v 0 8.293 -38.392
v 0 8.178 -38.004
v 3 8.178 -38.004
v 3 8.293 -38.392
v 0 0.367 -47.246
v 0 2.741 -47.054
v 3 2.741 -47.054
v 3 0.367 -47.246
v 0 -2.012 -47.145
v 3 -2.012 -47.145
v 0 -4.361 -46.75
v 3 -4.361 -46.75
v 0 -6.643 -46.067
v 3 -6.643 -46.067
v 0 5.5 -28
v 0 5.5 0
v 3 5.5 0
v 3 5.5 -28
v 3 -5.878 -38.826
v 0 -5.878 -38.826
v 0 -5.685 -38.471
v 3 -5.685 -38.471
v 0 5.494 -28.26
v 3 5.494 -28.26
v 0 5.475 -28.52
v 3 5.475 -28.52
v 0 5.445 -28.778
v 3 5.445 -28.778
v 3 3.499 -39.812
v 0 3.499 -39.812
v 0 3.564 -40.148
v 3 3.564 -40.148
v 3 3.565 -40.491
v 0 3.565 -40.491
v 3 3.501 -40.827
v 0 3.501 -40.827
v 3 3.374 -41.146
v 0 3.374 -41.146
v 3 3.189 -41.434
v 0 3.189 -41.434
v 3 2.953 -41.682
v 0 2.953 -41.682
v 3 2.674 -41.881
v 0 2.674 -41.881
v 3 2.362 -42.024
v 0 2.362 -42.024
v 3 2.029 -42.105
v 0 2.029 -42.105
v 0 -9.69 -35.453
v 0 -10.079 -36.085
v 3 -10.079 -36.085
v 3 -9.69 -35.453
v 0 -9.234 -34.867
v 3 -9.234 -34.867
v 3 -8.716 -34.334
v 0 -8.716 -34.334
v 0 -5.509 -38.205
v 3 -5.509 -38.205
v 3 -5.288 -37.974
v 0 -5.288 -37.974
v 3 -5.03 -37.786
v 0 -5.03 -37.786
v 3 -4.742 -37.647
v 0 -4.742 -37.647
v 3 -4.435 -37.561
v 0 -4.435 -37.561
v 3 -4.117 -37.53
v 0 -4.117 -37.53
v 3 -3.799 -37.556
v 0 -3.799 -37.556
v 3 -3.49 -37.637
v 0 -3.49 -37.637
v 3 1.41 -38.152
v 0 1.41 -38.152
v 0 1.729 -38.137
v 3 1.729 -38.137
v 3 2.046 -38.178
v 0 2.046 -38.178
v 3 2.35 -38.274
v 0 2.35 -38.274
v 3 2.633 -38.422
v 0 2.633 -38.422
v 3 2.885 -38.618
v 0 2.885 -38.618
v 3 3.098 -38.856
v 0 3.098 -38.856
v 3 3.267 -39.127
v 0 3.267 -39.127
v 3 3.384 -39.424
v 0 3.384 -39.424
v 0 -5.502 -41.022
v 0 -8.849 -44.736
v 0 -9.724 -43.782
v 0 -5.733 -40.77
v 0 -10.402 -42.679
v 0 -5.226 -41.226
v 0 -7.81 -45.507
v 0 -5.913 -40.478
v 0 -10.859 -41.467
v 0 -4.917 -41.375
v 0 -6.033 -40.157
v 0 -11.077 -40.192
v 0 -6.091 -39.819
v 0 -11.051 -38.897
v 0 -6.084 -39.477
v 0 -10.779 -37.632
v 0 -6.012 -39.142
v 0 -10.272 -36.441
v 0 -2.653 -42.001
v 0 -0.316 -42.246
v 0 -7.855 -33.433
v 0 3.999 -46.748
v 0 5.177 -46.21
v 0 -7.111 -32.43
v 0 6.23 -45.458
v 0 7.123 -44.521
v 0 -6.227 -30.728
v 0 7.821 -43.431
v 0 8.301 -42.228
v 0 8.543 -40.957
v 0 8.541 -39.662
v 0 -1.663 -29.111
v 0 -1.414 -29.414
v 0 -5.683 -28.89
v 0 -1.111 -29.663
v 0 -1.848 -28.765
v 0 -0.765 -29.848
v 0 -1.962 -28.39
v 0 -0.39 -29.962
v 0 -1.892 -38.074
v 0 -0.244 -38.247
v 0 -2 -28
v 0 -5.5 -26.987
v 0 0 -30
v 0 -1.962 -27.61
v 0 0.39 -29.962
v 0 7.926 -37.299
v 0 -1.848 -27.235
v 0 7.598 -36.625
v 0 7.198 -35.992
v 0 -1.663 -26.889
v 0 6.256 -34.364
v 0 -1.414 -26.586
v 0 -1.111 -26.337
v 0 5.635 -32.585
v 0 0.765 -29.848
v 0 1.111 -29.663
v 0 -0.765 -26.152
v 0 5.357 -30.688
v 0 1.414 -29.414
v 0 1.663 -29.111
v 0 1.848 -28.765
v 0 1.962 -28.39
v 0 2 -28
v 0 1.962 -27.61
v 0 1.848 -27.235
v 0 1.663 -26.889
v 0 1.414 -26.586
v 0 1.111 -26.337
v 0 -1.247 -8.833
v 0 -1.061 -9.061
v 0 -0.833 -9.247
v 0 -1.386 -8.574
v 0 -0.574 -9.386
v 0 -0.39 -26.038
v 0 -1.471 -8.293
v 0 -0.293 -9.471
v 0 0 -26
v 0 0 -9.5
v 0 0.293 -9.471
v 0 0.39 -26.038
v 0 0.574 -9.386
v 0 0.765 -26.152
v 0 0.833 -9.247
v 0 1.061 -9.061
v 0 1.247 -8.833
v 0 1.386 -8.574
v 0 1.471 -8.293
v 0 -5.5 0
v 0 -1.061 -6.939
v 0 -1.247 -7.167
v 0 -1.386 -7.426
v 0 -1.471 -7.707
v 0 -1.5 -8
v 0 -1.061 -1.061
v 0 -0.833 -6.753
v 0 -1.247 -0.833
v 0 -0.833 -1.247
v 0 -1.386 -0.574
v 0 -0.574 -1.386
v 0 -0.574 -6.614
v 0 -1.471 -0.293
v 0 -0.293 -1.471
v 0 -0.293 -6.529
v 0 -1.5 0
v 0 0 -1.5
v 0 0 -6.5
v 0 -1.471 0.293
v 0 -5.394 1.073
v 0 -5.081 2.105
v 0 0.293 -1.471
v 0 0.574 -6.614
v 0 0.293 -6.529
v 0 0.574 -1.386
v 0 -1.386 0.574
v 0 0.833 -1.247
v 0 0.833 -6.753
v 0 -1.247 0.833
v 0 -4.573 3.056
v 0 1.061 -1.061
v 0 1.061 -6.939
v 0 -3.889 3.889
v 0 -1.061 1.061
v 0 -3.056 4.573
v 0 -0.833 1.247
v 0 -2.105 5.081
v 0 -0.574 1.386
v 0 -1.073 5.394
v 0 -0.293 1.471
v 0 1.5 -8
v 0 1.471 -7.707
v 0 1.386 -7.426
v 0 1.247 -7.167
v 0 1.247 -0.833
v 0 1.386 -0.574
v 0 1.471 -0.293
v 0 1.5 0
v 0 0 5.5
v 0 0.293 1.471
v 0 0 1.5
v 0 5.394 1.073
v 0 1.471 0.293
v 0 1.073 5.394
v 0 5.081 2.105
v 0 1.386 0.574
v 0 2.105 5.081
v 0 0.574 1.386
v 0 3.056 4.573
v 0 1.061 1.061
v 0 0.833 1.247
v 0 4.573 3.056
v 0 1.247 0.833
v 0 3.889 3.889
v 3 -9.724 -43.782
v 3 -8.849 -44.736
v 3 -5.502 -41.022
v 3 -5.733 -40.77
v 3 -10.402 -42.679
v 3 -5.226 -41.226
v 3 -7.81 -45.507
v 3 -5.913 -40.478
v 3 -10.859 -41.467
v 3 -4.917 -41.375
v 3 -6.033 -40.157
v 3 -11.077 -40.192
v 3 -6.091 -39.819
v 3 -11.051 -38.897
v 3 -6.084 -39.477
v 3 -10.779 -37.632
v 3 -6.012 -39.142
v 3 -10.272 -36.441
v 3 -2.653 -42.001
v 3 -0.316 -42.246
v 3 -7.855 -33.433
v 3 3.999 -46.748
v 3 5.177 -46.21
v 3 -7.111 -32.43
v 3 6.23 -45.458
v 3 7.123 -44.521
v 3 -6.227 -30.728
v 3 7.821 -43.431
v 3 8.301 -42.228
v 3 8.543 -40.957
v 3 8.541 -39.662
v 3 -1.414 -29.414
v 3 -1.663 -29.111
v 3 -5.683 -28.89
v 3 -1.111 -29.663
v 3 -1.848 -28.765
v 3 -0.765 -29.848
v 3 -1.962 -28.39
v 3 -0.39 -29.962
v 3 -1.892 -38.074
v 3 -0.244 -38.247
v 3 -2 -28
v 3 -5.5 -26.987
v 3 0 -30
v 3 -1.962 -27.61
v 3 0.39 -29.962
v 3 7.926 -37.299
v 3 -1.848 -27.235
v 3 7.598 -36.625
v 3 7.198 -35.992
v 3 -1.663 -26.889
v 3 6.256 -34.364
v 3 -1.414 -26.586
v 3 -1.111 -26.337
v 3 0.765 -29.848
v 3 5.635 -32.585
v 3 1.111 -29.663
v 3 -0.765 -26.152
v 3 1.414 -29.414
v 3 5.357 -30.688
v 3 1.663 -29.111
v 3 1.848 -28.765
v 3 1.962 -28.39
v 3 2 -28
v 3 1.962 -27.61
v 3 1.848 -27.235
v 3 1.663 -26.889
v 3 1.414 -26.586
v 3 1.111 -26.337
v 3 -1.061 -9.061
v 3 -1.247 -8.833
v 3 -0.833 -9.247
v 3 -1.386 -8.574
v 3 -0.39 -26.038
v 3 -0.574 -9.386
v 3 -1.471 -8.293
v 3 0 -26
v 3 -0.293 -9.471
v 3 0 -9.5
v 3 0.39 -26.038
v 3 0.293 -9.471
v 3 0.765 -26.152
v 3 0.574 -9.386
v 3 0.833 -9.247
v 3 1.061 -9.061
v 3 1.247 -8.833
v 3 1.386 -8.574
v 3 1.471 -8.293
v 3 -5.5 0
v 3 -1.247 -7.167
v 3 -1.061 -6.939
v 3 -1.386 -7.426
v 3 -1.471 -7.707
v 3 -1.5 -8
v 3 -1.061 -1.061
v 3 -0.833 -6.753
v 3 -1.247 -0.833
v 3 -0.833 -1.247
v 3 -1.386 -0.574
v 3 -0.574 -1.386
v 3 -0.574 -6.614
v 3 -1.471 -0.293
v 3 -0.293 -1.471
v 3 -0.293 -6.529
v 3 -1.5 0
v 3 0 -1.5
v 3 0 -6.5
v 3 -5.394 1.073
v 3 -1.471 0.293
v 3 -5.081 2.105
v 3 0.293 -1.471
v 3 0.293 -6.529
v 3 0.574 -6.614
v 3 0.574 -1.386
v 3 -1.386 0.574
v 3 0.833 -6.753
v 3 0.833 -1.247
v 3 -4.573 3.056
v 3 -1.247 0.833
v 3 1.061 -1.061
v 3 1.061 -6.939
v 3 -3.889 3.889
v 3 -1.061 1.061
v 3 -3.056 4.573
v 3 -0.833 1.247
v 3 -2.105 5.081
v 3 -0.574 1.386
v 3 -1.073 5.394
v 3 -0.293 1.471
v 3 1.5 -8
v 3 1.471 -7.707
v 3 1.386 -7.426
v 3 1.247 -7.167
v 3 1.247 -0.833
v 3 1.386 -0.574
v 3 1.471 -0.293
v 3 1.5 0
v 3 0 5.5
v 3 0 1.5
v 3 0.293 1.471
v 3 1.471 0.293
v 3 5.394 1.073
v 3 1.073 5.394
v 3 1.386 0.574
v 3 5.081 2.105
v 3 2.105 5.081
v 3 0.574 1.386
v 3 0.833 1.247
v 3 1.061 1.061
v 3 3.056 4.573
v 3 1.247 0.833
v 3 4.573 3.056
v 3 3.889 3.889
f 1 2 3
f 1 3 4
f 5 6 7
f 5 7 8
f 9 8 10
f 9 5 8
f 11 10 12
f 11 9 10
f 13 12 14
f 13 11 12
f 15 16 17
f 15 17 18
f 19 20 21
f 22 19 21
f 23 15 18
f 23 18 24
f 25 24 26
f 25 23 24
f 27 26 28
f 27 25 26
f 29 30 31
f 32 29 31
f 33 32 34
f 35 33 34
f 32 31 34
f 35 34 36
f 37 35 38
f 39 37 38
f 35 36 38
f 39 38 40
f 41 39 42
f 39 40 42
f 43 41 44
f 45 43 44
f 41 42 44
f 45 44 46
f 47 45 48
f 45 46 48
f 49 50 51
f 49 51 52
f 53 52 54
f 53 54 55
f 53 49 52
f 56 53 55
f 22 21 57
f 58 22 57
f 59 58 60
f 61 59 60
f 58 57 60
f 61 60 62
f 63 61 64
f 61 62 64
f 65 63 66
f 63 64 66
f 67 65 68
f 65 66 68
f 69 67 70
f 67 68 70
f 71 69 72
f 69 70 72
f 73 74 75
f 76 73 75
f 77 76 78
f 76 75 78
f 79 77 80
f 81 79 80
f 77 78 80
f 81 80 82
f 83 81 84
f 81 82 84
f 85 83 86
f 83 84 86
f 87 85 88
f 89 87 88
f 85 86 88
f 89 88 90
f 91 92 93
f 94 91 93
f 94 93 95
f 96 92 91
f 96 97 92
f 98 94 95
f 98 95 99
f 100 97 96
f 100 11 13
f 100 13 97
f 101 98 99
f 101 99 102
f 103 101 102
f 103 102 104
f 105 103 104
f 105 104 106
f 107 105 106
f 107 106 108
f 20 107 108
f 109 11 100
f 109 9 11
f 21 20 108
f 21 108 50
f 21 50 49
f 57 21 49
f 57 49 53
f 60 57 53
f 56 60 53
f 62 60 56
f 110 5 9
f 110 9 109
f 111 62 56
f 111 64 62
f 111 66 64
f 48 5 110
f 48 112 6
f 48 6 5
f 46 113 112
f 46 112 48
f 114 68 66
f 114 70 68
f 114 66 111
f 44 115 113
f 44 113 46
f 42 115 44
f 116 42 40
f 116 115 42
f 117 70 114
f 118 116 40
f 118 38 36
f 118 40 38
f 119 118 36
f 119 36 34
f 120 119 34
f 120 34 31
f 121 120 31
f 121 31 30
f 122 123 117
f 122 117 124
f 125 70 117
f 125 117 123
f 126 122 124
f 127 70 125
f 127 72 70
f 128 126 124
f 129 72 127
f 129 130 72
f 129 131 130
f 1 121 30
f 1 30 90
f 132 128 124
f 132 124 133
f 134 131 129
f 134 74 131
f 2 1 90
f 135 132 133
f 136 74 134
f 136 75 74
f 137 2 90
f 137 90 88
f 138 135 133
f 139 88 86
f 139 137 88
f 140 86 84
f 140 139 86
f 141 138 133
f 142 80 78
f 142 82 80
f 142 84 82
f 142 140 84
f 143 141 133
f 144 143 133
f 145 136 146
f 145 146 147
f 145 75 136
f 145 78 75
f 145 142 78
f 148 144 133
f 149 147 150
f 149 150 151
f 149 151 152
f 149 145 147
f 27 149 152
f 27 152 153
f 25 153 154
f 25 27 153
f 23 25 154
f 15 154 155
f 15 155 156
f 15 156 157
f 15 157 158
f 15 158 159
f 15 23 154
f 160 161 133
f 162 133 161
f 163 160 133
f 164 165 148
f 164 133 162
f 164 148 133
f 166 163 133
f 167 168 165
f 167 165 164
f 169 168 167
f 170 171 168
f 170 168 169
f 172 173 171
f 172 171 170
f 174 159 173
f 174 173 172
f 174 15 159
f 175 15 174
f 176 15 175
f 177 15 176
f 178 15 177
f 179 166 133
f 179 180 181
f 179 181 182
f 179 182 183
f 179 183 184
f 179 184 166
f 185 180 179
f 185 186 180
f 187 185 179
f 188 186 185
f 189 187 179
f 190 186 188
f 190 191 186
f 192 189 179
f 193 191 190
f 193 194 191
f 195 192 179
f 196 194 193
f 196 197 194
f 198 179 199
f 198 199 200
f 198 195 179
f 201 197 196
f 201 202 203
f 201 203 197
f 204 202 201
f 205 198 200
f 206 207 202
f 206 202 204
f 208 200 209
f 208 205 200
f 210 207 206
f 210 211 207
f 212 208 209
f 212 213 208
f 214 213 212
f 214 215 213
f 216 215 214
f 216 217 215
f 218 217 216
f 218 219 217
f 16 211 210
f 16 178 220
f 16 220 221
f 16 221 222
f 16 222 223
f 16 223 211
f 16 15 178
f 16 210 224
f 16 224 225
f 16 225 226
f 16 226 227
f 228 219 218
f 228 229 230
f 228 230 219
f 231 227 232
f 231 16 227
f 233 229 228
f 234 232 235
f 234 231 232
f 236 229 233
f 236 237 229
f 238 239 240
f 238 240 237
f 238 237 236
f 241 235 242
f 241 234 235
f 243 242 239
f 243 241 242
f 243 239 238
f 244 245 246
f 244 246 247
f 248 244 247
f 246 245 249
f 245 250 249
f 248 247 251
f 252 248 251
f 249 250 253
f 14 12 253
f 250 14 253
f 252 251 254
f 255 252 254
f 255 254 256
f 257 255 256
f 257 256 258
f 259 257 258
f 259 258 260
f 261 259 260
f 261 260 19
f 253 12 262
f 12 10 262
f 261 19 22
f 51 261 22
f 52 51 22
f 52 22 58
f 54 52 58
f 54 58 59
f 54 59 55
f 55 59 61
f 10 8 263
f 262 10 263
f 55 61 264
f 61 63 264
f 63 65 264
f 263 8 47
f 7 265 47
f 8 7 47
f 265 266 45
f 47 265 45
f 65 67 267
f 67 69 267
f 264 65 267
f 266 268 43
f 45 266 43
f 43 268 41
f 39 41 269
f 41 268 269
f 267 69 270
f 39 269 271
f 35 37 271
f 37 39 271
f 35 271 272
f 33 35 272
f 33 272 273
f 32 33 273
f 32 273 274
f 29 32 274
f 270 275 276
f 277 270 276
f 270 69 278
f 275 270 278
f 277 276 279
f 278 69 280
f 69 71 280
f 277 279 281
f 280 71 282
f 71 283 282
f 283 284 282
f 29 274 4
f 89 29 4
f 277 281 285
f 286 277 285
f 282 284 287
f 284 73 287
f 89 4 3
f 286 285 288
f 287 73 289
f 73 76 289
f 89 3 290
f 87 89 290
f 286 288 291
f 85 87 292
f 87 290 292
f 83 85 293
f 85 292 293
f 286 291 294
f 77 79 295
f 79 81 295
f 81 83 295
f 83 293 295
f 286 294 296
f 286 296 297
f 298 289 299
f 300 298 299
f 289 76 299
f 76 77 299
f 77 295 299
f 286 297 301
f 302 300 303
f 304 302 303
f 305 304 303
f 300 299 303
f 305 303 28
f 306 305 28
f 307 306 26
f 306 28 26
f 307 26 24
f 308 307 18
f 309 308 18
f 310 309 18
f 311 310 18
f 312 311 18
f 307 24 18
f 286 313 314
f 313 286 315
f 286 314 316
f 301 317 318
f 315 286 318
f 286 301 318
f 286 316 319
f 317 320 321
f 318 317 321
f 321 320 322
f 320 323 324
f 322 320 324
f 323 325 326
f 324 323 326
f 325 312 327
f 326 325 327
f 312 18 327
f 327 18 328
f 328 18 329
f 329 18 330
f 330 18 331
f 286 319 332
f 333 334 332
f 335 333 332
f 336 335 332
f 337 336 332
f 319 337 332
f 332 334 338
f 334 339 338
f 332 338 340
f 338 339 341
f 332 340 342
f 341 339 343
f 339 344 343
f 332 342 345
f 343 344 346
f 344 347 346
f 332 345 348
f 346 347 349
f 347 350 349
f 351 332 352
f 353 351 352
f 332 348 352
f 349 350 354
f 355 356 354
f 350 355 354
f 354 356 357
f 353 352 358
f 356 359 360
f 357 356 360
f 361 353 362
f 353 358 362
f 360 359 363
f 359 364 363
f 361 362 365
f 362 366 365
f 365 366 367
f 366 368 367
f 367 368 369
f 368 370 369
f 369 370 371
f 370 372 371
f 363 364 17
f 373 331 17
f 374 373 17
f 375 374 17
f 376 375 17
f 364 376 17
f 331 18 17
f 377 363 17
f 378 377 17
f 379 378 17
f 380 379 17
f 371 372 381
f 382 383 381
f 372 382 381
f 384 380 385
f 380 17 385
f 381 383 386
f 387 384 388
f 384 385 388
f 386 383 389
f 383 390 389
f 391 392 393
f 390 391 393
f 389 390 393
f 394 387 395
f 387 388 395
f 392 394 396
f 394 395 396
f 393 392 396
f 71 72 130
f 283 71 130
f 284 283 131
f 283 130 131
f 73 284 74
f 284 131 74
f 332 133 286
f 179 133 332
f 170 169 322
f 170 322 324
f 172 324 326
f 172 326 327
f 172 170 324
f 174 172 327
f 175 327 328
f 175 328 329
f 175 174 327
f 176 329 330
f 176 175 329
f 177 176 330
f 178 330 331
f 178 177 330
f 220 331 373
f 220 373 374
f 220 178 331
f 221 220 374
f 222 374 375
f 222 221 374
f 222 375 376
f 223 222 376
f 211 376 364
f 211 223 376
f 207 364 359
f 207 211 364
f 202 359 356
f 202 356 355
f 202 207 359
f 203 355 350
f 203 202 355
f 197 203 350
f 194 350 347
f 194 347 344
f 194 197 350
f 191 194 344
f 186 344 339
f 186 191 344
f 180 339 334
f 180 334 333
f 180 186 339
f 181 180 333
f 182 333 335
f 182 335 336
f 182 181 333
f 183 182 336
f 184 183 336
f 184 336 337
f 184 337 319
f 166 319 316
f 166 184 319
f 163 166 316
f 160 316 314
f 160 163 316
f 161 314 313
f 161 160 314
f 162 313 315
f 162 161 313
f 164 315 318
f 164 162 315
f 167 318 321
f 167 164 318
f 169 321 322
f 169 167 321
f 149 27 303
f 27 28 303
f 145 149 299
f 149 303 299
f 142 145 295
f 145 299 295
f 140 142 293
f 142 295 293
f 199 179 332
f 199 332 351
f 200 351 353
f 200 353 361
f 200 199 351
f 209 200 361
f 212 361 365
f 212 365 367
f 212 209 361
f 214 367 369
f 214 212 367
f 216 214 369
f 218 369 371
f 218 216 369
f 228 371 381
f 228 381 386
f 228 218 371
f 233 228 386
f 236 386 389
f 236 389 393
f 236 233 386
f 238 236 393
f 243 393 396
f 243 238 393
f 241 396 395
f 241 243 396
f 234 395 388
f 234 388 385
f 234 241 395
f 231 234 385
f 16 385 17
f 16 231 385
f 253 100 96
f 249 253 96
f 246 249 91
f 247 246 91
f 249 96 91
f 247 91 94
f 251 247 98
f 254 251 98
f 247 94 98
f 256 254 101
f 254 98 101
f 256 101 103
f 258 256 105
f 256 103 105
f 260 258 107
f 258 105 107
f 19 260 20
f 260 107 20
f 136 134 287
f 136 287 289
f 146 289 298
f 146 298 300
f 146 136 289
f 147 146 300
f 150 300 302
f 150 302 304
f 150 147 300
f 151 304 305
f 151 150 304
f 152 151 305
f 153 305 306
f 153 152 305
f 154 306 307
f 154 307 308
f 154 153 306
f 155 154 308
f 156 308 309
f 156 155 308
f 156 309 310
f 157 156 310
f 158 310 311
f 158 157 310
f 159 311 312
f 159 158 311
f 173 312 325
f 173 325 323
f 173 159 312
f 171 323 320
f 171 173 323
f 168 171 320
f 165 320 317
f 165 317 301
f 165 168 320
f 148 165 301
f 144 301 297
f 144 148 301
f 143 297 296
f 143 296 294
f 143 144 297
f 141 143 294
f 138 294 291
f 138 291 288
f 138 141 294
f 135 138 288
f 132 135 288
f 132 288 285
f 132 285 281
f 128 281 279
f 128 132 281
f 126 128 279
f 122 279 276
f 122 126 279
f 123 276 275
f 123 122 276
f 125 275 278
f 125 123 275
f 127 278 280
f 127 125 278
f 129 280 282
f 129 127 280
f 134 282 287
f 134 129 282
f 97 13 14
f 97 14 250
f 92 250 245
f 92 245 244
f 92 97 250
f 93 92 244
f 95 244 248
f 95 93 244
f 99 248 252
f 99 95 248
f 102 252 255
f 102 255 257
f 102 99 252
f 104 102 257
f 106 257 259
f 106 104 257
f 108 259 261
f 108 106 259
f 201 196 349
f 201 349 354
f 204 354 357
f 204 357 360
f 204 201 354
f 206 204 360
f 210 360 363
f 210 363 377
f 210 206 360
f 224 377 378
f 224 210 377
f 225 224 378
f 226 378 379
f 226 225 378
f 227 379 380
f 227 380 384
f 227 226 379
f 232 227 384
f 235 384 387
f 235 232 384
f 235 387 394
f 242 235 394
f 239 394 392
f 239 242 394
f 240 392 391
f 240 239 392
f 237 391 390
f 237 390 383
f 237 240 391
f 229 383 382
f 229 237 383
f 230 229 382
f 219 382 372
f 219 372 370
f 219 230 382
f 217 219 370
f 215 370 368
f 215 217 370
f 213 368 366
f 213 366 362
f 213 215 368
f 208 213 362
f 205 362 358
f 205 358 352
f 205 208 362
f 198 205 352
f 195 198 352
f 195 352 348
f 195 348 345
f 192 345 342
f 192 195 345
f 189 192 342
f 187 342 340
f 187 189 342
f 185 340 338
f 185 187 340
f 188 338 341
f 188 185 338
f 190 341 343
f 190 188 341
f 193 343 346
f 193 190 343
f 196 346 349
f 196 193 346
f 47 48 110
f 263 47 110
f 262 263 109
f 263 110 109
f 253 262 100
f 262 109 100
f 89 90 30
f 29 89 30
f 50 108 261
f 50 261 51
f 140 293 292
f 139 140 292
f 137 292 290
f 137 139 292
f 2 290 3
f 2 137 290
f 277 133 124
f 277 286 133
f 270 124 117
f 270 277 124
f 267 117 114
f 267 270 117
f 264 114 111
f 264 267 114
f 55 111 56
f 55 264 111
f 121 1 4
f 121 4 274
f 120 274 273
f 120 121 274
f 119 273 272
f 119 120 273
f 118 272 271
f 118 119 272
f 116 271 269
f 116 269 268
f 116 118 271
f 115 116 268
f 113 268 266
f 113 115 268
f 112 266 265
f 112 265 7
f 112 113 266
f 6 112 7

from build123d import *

# Parameters (mm, degrees)
SKETCH1_R           = 1.5
SKETCH1_R_2         = 2
BOSS_EXTRUDE1_DEPTH = 3
FILLET1_R           = 10


with BuildPart() as part:
    # Sketch1 → Boss-Extrude1 (new body)
    with BuildSketch(Plane(origin=(0, 0, 0), x_dir=(0, 0, -1), z_dir=(1, 0, 0))):
        with BuildLine():
            Line((0, 5.5), (28, 5.5))
            ThreePointArc((28, 5.5), (33.5, 0), (28, -5.5))
            Line((28, -5.5), (0, -5.5))
            ThreePointArc((0, -5.5), (-5.5, 0), (0, 5.5))
        make_face()
        Circle(SKETCH1_R, mode=Mode.SUBTRACT)
        with Locations((8, 0)):
            Circle(SKETCH1_R, mode=Mode.SUBTRACT)
        with Locations((28, 0)):
            Circle(SKETCH1_R_2, mode=Mode.SUBTRACT)
        with BuildLine():
            Line((38.004070302, 8.178085192), (38.391808013, 8.292938334))
            ThreePointArc((38.391808013, 8.292938334), (43.99239408, 7.498029345), (47.053808263, 2.741330092))
            ThreePointArc((47.053808263, 2.741330092), (47.144546486, -2.012172918), (46.067482263, -6.642934944))
            ThreePointArc((46.067482263, -6.642934944), (42.08399394, -10.659185108), (36.440523244, -10.272296109))
            Line((36.440523244, -10.272296109), (36.085137843, -10.07933758))
            ThreePointArc((36.085137843, -10.07933758), (32.972810208, -6.517601461), (32.936227504, -1.787780197))
            ThreePointArc((32.936227504, -1.787780197), (33.221239951, -0.548774432), (33.200059493, 0.722413504))
            ThreePointArc((33.200059493, 0.722413504), (34.219227914, 5.341270853), (38.004070302, 8.178085192))
        make_face()
        with BuildLine():
            Line((39.424147025, 3.383986517), (39.811884737, 3.49883966))
            ThreePointArc((39.811884737, 3.49883966), (41.294392813, 3.288422575), (42.104767156, 2.029296302))
            ThreePointArc((42.104767156, 2.029296302), (42.171937009, -1.489530602), (41.374629727, -4.917497297))
            ThreePointArc((41.374629727, -4.917497297), (40.320176936, -5.98062234), (38.826317046, -5.878210546))
            Line((38.826317046, -5.878210546), (38.470931645, -5.685252017))
            ThreePointArc((38.470931645, -5.685252017), (37.647080212, -4.742439515), (37.637396555, -3.490428004))
            ThreePointArc((37.637396555, -3.490428004), (38.193849428, -1.071416748), (38.152497105, 1.410426365))
            ThreePointArc((38.152497105, 1.410426365), (38.422276981, 2.633065075), (39.424147025, 3.383986517))
        make_face(mode=Mode.SUBTRACT)
    extrude(amount=BOSS_EXTRUDE1_DEPTH)

    # Fillet1
    fillet1_edges = [part.edges().sort_by_distance(p)[0] for p in [
        (1.5, -2.978897206, -32.623437188),
        (1.5, 1.952534512, -33.141751548),
    ]]
    fillet(fillet1_edges, radius=FILLET1_R)


solid = part.part
